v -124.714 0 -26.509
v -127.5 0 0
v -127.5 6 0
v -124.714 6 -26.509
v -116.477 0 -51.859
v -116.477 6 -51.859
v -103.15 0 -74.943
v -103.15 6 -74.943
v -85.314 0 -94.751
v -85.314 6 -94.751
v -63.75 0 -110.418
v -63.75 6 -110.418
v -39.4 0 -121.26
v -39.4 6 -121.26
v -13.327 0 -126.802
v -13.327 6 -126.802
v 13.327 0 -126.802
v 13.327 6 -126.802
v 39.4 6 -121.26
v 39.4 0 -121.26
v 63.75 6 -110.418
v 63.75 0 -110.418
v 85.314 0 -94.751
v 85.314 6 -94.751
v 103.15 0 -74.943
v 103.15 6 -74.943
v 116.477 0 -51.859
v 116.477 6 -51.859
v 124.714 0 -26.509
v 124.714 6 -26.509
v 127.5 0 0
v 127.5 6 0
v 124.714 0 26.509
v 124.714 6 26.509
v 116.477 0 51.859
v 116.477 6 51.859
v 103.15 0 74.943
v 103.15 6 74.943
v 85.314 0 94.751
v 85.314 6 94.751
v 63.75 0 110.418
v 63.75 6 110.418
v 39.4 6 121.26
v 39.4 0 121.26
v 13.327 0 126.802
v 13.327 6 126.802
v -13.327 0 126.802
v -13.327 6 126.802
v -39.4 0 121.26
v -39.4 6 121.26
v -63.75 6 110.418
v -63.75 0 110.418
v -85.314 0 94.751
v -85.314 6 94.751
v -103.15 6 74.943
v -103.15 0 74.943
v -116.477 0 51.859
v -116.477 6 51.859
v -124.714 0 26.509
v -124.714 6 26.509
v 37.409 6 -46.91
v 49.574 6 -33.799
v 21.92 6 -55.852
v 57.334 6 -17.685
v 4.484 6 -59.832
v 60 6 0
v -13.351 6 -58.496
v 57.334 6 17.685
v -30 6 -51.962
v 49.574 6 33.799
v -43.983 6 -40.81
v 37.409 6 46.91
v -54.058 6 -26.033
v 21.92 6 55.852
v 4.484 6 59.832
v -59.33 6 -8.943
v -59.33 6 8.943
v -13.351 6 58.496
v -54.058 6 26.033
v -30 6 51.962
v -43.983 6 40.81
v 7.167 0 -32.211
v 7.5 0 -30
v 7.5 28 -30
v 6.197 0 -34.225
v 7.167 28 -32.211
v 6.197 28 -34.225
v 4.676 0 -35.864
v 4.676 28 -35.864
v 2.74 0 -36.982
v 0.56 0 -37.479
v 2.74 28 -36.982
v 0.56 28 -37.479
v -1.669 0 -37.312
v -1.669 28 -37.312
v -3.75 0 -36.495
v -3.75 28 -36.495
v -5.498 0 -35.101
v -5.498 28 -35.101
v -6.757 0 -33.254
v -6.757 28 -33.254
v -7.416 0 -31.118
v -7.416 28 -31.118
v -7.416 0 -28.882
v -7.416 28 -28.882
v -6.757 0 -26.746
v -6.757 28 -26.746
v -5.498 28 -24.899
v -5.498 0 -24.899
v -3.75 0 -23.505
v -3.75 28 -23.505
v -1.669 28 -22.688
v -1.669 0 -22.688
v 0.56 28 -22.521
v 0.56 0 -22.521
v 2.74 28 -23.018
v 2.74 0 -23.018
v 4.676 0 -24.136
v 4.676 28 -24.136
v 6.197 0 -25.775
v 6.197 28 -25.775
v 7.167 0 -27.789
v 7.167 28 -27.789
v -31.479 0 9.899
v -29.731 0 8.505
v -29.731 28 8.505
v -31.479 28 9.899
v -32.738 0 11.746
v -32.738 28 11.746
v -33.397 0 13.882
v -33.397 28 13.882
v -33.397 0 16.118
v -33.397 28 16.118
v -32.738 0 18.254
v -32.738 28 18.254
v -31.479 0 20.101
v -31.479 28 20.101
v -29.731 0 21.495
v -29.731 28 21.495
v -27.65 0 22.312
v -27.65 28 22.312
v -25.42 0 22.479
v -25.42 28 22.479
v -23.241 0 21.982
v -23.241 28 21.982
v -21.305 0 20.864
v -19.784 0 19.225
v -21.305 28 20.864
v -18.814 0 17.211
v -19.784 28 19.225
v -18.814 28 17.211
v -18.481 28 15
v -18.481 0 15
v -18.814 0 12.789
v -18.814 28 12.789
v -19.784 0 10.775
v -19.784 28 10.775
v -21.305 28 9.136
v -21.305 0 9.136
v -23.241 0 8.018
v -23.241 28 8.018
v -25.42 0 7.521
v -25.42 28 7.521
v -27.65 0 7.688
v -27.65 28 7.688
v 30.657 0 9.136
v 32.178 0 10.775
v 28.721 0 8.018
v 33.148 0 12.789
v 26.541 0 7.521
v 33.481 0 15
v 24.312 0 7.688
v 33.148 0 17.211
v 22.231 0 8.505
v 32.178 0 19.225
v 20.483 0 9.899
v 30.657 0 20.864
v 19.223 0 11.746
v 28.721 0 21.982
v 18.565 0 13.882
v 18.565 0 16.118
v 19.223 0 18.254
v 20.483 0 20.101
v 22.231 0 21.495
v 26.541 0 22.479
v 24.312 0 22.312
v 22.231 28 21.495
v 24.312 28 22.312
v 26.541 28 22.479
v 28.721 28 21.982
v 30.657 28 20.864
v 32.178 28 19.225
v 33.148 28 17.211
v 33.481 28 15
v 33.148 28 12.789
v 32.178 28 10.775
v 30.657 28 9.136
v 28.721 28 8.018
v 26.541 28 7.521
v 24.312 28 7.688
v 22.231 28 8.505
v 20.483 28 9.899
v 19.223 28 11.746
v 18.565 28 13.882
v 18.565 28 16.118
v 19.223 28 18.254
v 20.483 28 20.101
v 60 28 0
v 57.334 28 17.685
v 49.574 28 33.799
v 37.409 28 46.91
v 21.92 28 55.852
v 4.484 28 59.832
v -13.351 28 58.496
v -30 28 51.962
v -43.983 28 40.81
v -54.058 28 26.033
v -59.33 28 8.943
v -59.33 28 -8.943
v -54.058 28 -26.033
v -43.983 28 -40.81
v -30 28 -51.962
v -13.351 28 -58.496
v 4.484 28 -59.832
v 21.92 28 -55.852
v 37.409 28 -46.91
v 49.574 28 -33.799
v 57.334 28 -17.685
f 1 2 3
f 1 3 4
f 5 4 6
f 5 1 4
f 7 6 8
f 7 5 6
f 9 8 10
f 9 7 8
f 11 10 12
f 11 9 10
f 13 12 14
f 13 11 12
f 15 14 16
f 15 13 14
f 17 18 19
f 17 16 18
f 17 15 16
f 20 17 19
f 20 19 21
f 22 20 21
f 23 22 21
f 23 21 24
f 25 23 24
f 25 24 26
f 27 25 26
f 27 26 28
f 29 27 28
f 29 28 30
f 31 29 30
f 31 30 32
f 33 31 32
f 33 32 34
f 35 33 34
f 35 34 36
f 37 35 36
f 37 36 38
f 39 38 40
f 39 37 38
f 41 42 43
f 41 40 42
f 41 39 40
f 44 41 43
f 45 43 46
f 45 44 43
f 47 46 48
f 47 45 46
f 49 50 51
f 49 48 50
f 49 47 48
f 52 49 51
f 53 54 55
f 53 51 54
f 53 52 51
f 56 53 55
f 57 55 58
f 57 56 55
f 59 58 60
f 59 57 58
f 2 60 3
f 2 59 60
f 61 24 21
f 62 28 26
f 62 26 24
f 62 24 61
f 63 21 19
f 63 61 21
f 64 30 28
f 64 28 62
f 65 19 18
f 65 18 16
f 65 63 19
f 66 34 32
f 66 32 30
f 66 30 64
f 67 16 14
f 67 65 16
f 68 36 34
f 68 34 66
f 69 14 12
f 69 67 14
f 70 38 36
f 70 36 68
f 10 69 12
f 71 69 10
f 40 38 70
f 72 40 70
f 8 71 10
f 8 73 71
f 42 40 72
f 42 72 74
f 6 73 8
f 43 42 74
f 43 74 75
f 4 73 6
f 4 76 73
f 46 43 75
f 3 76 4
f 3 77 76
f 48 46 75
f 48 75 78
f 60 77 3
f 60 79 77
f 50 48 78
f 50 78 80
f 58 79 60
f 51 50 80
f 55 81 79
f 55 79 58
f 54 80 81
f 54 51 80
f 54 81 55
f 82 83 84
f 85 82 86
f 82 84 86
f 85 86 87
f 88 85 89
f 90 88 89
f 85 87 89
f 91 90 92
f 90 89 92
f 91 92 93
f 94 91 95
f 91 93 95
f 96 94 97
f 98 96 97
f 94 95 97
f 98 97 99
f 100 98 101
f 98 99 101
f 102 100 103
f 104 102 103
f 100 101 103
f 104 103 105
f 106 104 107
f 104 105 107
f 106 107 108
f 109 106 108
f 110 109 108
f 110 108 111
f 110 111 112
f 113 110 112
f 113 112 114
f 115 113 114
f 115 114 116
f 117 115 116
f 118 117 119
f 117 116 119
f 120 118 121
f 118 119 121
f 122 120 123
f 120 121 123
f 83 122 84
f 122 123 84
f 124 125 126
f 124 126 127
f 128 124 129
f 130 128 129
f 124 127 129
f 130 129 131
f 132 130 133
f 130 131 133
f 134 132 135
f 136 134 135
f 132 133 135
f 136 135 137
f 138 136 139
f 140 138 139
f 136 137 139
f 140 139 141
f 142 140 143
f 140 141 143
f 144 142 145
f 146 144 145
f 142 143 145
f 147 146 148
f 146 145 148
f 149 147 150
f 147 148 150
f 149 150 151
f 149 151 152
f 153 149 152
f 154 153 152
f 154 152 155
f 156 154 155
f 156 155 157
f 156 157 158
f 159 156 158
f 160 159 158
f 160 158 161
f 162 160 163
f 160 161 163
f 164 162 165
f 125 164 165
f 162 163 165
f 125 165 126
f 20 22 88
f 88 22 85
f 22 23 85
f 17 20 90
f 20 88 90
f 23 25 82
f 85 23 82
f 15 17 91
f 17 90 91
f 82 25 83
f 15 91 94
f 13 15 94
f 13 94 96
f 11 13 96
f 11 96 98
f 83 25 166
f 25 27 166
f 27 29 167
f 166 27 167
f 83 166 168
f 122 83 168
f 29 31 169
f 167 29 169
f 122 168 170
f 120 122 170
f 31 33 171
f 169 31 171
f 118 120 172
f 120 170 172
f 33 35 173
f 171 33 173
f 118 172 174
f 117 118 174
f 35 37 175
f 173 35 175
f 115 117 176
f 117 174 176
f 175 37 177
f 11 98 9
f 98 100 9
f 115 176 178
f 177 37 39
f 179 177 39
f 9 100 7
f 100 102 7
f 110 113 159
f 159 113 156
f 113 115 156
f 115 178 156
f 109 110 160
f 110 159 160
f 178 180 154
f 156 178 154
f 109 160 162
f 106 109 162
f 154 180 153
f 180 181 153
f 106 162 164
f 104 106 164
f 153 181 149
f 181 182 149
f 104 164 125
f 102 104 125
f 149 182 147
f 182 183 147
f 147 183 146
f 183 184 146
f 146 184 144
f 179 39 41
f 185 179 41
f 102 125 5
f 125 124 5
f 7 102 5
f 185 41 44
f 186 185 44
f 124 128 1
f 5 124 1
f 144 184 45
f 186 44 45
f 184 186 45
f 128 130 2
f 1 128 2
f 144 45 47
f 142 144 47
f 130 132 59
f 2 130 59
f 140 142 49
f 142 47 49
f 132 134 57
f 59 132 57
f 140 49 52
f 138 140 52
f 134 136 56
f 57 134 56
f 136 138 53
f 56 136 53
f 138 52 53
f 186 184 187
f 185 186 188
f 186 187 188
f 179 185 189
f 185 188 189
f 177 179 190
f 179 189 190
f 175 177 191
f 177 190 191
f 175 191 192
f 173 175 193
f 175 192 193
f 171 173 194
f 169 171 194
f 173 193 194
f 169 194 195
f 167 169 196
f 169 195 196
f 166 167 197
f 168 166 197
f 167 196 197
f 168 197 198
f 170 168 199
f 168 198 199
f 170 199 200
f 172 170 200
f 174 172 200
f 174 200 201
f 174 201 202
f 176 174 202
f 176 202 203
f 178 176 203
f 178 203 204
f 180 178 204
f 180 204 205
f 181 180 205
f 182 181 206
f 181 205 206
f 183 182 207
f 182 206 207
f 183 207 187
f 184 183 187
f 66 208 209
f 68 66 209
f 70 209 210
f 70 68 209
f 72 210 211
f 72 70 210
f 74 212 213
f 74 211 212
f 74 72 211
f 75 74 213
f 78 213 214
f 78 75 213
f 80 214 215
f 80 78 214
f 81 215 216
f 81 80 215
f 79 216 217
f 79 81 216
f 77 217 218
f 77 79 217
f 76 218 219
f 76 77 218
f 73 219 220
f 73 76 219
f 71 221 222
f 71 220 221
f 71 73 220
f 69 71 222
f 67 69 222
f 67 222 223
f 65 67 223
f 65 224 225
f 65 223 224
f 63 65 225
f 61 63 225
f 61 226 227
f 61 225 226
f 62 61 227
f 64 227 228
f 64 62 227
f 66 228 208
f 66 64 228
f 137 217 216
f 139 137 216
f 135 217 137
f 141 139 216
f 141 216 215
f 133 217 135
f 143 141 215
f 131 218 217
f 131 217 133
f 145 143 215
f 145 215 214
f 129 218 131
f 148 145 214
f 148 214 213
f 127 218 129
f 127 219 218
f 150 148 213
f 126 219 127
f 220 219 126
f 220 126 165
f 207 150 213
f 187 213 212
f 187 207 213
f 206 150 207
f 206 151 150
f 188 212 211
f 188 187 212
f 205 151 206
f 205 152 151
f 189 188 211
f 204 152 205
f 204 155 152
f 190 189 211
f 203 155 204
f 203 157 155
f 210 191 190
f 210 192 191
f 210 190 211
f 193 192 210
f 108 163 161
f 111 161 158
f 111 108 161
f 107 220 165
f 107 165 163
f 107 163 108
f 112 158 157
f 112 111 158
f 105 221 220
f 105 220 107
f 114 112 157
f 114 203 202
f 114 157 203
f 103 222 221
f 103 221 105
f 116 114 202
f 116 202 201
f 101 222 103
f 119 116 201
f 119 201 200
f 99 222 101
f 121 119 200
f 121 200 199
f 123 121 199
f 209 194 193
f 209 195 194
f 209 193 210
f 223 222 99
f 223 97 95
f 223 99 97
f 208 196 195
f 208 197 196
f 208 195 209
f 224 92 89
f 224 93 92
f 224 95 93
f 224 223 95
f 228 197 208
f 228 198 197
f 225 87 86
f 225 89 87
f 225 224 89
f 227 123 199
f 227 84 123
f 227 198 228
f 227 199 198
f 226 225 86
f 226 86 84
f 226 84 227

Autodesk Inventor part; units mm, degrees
ref_plane "YZ Plane" through (0, 0, 0) normal (1, 0, 0) x (0, 1, 0)
ref_plane "XZ Plane" through (0, 0, 0) normal (0, 1, 0) x (-1, 0, 0)
ref_plane "XY Plane" through (0, 0, 0) normal (0, 0, 1) x (1, 0, 0)
sketch "Sketch1" plane through (0, 0, 0) normal (0, 1, 0) x (-1, 0, 0)
  circle A0 centre (0, 0) radius 127.5
  dimension "d0" = 255
extrude "Extrusion1" add sketch "Sketch1" along normal blind 6
sketch "Sketch2" plane through (0, 6, 0) normal (0, 1, 0) x (1, 0, 0)
  circle A0 centre (0, 0) radius 127.5 projected
  circle A1 centre (0, 0) radius 60
  dimension "d4" = 120
extrude "Extrusion2" add sketch "Sketch2" along normal blind 22 contours A1
sketch "Sketch3" plane through (0, 28, 0) normal (0, 1, 0) x (1, 0, 0)
  circle A0 centre (0, 0) radius 60 projected
  circle A1 centre (0, 30) radius 7.5
  line L0 (0, 30) -> (0, 0) construction
  dimension "d8" = 15
  dimension "d16" = 30
extrude "Extrusion3" cut sketch "Sketch3" against normal through all contours A1
pattern_circular "Circular Pattern1" count 3 over 360 about axis through (0, 6, 0) along (0, 1, 0) of "Extrusion3"
properties part number "rotor"
